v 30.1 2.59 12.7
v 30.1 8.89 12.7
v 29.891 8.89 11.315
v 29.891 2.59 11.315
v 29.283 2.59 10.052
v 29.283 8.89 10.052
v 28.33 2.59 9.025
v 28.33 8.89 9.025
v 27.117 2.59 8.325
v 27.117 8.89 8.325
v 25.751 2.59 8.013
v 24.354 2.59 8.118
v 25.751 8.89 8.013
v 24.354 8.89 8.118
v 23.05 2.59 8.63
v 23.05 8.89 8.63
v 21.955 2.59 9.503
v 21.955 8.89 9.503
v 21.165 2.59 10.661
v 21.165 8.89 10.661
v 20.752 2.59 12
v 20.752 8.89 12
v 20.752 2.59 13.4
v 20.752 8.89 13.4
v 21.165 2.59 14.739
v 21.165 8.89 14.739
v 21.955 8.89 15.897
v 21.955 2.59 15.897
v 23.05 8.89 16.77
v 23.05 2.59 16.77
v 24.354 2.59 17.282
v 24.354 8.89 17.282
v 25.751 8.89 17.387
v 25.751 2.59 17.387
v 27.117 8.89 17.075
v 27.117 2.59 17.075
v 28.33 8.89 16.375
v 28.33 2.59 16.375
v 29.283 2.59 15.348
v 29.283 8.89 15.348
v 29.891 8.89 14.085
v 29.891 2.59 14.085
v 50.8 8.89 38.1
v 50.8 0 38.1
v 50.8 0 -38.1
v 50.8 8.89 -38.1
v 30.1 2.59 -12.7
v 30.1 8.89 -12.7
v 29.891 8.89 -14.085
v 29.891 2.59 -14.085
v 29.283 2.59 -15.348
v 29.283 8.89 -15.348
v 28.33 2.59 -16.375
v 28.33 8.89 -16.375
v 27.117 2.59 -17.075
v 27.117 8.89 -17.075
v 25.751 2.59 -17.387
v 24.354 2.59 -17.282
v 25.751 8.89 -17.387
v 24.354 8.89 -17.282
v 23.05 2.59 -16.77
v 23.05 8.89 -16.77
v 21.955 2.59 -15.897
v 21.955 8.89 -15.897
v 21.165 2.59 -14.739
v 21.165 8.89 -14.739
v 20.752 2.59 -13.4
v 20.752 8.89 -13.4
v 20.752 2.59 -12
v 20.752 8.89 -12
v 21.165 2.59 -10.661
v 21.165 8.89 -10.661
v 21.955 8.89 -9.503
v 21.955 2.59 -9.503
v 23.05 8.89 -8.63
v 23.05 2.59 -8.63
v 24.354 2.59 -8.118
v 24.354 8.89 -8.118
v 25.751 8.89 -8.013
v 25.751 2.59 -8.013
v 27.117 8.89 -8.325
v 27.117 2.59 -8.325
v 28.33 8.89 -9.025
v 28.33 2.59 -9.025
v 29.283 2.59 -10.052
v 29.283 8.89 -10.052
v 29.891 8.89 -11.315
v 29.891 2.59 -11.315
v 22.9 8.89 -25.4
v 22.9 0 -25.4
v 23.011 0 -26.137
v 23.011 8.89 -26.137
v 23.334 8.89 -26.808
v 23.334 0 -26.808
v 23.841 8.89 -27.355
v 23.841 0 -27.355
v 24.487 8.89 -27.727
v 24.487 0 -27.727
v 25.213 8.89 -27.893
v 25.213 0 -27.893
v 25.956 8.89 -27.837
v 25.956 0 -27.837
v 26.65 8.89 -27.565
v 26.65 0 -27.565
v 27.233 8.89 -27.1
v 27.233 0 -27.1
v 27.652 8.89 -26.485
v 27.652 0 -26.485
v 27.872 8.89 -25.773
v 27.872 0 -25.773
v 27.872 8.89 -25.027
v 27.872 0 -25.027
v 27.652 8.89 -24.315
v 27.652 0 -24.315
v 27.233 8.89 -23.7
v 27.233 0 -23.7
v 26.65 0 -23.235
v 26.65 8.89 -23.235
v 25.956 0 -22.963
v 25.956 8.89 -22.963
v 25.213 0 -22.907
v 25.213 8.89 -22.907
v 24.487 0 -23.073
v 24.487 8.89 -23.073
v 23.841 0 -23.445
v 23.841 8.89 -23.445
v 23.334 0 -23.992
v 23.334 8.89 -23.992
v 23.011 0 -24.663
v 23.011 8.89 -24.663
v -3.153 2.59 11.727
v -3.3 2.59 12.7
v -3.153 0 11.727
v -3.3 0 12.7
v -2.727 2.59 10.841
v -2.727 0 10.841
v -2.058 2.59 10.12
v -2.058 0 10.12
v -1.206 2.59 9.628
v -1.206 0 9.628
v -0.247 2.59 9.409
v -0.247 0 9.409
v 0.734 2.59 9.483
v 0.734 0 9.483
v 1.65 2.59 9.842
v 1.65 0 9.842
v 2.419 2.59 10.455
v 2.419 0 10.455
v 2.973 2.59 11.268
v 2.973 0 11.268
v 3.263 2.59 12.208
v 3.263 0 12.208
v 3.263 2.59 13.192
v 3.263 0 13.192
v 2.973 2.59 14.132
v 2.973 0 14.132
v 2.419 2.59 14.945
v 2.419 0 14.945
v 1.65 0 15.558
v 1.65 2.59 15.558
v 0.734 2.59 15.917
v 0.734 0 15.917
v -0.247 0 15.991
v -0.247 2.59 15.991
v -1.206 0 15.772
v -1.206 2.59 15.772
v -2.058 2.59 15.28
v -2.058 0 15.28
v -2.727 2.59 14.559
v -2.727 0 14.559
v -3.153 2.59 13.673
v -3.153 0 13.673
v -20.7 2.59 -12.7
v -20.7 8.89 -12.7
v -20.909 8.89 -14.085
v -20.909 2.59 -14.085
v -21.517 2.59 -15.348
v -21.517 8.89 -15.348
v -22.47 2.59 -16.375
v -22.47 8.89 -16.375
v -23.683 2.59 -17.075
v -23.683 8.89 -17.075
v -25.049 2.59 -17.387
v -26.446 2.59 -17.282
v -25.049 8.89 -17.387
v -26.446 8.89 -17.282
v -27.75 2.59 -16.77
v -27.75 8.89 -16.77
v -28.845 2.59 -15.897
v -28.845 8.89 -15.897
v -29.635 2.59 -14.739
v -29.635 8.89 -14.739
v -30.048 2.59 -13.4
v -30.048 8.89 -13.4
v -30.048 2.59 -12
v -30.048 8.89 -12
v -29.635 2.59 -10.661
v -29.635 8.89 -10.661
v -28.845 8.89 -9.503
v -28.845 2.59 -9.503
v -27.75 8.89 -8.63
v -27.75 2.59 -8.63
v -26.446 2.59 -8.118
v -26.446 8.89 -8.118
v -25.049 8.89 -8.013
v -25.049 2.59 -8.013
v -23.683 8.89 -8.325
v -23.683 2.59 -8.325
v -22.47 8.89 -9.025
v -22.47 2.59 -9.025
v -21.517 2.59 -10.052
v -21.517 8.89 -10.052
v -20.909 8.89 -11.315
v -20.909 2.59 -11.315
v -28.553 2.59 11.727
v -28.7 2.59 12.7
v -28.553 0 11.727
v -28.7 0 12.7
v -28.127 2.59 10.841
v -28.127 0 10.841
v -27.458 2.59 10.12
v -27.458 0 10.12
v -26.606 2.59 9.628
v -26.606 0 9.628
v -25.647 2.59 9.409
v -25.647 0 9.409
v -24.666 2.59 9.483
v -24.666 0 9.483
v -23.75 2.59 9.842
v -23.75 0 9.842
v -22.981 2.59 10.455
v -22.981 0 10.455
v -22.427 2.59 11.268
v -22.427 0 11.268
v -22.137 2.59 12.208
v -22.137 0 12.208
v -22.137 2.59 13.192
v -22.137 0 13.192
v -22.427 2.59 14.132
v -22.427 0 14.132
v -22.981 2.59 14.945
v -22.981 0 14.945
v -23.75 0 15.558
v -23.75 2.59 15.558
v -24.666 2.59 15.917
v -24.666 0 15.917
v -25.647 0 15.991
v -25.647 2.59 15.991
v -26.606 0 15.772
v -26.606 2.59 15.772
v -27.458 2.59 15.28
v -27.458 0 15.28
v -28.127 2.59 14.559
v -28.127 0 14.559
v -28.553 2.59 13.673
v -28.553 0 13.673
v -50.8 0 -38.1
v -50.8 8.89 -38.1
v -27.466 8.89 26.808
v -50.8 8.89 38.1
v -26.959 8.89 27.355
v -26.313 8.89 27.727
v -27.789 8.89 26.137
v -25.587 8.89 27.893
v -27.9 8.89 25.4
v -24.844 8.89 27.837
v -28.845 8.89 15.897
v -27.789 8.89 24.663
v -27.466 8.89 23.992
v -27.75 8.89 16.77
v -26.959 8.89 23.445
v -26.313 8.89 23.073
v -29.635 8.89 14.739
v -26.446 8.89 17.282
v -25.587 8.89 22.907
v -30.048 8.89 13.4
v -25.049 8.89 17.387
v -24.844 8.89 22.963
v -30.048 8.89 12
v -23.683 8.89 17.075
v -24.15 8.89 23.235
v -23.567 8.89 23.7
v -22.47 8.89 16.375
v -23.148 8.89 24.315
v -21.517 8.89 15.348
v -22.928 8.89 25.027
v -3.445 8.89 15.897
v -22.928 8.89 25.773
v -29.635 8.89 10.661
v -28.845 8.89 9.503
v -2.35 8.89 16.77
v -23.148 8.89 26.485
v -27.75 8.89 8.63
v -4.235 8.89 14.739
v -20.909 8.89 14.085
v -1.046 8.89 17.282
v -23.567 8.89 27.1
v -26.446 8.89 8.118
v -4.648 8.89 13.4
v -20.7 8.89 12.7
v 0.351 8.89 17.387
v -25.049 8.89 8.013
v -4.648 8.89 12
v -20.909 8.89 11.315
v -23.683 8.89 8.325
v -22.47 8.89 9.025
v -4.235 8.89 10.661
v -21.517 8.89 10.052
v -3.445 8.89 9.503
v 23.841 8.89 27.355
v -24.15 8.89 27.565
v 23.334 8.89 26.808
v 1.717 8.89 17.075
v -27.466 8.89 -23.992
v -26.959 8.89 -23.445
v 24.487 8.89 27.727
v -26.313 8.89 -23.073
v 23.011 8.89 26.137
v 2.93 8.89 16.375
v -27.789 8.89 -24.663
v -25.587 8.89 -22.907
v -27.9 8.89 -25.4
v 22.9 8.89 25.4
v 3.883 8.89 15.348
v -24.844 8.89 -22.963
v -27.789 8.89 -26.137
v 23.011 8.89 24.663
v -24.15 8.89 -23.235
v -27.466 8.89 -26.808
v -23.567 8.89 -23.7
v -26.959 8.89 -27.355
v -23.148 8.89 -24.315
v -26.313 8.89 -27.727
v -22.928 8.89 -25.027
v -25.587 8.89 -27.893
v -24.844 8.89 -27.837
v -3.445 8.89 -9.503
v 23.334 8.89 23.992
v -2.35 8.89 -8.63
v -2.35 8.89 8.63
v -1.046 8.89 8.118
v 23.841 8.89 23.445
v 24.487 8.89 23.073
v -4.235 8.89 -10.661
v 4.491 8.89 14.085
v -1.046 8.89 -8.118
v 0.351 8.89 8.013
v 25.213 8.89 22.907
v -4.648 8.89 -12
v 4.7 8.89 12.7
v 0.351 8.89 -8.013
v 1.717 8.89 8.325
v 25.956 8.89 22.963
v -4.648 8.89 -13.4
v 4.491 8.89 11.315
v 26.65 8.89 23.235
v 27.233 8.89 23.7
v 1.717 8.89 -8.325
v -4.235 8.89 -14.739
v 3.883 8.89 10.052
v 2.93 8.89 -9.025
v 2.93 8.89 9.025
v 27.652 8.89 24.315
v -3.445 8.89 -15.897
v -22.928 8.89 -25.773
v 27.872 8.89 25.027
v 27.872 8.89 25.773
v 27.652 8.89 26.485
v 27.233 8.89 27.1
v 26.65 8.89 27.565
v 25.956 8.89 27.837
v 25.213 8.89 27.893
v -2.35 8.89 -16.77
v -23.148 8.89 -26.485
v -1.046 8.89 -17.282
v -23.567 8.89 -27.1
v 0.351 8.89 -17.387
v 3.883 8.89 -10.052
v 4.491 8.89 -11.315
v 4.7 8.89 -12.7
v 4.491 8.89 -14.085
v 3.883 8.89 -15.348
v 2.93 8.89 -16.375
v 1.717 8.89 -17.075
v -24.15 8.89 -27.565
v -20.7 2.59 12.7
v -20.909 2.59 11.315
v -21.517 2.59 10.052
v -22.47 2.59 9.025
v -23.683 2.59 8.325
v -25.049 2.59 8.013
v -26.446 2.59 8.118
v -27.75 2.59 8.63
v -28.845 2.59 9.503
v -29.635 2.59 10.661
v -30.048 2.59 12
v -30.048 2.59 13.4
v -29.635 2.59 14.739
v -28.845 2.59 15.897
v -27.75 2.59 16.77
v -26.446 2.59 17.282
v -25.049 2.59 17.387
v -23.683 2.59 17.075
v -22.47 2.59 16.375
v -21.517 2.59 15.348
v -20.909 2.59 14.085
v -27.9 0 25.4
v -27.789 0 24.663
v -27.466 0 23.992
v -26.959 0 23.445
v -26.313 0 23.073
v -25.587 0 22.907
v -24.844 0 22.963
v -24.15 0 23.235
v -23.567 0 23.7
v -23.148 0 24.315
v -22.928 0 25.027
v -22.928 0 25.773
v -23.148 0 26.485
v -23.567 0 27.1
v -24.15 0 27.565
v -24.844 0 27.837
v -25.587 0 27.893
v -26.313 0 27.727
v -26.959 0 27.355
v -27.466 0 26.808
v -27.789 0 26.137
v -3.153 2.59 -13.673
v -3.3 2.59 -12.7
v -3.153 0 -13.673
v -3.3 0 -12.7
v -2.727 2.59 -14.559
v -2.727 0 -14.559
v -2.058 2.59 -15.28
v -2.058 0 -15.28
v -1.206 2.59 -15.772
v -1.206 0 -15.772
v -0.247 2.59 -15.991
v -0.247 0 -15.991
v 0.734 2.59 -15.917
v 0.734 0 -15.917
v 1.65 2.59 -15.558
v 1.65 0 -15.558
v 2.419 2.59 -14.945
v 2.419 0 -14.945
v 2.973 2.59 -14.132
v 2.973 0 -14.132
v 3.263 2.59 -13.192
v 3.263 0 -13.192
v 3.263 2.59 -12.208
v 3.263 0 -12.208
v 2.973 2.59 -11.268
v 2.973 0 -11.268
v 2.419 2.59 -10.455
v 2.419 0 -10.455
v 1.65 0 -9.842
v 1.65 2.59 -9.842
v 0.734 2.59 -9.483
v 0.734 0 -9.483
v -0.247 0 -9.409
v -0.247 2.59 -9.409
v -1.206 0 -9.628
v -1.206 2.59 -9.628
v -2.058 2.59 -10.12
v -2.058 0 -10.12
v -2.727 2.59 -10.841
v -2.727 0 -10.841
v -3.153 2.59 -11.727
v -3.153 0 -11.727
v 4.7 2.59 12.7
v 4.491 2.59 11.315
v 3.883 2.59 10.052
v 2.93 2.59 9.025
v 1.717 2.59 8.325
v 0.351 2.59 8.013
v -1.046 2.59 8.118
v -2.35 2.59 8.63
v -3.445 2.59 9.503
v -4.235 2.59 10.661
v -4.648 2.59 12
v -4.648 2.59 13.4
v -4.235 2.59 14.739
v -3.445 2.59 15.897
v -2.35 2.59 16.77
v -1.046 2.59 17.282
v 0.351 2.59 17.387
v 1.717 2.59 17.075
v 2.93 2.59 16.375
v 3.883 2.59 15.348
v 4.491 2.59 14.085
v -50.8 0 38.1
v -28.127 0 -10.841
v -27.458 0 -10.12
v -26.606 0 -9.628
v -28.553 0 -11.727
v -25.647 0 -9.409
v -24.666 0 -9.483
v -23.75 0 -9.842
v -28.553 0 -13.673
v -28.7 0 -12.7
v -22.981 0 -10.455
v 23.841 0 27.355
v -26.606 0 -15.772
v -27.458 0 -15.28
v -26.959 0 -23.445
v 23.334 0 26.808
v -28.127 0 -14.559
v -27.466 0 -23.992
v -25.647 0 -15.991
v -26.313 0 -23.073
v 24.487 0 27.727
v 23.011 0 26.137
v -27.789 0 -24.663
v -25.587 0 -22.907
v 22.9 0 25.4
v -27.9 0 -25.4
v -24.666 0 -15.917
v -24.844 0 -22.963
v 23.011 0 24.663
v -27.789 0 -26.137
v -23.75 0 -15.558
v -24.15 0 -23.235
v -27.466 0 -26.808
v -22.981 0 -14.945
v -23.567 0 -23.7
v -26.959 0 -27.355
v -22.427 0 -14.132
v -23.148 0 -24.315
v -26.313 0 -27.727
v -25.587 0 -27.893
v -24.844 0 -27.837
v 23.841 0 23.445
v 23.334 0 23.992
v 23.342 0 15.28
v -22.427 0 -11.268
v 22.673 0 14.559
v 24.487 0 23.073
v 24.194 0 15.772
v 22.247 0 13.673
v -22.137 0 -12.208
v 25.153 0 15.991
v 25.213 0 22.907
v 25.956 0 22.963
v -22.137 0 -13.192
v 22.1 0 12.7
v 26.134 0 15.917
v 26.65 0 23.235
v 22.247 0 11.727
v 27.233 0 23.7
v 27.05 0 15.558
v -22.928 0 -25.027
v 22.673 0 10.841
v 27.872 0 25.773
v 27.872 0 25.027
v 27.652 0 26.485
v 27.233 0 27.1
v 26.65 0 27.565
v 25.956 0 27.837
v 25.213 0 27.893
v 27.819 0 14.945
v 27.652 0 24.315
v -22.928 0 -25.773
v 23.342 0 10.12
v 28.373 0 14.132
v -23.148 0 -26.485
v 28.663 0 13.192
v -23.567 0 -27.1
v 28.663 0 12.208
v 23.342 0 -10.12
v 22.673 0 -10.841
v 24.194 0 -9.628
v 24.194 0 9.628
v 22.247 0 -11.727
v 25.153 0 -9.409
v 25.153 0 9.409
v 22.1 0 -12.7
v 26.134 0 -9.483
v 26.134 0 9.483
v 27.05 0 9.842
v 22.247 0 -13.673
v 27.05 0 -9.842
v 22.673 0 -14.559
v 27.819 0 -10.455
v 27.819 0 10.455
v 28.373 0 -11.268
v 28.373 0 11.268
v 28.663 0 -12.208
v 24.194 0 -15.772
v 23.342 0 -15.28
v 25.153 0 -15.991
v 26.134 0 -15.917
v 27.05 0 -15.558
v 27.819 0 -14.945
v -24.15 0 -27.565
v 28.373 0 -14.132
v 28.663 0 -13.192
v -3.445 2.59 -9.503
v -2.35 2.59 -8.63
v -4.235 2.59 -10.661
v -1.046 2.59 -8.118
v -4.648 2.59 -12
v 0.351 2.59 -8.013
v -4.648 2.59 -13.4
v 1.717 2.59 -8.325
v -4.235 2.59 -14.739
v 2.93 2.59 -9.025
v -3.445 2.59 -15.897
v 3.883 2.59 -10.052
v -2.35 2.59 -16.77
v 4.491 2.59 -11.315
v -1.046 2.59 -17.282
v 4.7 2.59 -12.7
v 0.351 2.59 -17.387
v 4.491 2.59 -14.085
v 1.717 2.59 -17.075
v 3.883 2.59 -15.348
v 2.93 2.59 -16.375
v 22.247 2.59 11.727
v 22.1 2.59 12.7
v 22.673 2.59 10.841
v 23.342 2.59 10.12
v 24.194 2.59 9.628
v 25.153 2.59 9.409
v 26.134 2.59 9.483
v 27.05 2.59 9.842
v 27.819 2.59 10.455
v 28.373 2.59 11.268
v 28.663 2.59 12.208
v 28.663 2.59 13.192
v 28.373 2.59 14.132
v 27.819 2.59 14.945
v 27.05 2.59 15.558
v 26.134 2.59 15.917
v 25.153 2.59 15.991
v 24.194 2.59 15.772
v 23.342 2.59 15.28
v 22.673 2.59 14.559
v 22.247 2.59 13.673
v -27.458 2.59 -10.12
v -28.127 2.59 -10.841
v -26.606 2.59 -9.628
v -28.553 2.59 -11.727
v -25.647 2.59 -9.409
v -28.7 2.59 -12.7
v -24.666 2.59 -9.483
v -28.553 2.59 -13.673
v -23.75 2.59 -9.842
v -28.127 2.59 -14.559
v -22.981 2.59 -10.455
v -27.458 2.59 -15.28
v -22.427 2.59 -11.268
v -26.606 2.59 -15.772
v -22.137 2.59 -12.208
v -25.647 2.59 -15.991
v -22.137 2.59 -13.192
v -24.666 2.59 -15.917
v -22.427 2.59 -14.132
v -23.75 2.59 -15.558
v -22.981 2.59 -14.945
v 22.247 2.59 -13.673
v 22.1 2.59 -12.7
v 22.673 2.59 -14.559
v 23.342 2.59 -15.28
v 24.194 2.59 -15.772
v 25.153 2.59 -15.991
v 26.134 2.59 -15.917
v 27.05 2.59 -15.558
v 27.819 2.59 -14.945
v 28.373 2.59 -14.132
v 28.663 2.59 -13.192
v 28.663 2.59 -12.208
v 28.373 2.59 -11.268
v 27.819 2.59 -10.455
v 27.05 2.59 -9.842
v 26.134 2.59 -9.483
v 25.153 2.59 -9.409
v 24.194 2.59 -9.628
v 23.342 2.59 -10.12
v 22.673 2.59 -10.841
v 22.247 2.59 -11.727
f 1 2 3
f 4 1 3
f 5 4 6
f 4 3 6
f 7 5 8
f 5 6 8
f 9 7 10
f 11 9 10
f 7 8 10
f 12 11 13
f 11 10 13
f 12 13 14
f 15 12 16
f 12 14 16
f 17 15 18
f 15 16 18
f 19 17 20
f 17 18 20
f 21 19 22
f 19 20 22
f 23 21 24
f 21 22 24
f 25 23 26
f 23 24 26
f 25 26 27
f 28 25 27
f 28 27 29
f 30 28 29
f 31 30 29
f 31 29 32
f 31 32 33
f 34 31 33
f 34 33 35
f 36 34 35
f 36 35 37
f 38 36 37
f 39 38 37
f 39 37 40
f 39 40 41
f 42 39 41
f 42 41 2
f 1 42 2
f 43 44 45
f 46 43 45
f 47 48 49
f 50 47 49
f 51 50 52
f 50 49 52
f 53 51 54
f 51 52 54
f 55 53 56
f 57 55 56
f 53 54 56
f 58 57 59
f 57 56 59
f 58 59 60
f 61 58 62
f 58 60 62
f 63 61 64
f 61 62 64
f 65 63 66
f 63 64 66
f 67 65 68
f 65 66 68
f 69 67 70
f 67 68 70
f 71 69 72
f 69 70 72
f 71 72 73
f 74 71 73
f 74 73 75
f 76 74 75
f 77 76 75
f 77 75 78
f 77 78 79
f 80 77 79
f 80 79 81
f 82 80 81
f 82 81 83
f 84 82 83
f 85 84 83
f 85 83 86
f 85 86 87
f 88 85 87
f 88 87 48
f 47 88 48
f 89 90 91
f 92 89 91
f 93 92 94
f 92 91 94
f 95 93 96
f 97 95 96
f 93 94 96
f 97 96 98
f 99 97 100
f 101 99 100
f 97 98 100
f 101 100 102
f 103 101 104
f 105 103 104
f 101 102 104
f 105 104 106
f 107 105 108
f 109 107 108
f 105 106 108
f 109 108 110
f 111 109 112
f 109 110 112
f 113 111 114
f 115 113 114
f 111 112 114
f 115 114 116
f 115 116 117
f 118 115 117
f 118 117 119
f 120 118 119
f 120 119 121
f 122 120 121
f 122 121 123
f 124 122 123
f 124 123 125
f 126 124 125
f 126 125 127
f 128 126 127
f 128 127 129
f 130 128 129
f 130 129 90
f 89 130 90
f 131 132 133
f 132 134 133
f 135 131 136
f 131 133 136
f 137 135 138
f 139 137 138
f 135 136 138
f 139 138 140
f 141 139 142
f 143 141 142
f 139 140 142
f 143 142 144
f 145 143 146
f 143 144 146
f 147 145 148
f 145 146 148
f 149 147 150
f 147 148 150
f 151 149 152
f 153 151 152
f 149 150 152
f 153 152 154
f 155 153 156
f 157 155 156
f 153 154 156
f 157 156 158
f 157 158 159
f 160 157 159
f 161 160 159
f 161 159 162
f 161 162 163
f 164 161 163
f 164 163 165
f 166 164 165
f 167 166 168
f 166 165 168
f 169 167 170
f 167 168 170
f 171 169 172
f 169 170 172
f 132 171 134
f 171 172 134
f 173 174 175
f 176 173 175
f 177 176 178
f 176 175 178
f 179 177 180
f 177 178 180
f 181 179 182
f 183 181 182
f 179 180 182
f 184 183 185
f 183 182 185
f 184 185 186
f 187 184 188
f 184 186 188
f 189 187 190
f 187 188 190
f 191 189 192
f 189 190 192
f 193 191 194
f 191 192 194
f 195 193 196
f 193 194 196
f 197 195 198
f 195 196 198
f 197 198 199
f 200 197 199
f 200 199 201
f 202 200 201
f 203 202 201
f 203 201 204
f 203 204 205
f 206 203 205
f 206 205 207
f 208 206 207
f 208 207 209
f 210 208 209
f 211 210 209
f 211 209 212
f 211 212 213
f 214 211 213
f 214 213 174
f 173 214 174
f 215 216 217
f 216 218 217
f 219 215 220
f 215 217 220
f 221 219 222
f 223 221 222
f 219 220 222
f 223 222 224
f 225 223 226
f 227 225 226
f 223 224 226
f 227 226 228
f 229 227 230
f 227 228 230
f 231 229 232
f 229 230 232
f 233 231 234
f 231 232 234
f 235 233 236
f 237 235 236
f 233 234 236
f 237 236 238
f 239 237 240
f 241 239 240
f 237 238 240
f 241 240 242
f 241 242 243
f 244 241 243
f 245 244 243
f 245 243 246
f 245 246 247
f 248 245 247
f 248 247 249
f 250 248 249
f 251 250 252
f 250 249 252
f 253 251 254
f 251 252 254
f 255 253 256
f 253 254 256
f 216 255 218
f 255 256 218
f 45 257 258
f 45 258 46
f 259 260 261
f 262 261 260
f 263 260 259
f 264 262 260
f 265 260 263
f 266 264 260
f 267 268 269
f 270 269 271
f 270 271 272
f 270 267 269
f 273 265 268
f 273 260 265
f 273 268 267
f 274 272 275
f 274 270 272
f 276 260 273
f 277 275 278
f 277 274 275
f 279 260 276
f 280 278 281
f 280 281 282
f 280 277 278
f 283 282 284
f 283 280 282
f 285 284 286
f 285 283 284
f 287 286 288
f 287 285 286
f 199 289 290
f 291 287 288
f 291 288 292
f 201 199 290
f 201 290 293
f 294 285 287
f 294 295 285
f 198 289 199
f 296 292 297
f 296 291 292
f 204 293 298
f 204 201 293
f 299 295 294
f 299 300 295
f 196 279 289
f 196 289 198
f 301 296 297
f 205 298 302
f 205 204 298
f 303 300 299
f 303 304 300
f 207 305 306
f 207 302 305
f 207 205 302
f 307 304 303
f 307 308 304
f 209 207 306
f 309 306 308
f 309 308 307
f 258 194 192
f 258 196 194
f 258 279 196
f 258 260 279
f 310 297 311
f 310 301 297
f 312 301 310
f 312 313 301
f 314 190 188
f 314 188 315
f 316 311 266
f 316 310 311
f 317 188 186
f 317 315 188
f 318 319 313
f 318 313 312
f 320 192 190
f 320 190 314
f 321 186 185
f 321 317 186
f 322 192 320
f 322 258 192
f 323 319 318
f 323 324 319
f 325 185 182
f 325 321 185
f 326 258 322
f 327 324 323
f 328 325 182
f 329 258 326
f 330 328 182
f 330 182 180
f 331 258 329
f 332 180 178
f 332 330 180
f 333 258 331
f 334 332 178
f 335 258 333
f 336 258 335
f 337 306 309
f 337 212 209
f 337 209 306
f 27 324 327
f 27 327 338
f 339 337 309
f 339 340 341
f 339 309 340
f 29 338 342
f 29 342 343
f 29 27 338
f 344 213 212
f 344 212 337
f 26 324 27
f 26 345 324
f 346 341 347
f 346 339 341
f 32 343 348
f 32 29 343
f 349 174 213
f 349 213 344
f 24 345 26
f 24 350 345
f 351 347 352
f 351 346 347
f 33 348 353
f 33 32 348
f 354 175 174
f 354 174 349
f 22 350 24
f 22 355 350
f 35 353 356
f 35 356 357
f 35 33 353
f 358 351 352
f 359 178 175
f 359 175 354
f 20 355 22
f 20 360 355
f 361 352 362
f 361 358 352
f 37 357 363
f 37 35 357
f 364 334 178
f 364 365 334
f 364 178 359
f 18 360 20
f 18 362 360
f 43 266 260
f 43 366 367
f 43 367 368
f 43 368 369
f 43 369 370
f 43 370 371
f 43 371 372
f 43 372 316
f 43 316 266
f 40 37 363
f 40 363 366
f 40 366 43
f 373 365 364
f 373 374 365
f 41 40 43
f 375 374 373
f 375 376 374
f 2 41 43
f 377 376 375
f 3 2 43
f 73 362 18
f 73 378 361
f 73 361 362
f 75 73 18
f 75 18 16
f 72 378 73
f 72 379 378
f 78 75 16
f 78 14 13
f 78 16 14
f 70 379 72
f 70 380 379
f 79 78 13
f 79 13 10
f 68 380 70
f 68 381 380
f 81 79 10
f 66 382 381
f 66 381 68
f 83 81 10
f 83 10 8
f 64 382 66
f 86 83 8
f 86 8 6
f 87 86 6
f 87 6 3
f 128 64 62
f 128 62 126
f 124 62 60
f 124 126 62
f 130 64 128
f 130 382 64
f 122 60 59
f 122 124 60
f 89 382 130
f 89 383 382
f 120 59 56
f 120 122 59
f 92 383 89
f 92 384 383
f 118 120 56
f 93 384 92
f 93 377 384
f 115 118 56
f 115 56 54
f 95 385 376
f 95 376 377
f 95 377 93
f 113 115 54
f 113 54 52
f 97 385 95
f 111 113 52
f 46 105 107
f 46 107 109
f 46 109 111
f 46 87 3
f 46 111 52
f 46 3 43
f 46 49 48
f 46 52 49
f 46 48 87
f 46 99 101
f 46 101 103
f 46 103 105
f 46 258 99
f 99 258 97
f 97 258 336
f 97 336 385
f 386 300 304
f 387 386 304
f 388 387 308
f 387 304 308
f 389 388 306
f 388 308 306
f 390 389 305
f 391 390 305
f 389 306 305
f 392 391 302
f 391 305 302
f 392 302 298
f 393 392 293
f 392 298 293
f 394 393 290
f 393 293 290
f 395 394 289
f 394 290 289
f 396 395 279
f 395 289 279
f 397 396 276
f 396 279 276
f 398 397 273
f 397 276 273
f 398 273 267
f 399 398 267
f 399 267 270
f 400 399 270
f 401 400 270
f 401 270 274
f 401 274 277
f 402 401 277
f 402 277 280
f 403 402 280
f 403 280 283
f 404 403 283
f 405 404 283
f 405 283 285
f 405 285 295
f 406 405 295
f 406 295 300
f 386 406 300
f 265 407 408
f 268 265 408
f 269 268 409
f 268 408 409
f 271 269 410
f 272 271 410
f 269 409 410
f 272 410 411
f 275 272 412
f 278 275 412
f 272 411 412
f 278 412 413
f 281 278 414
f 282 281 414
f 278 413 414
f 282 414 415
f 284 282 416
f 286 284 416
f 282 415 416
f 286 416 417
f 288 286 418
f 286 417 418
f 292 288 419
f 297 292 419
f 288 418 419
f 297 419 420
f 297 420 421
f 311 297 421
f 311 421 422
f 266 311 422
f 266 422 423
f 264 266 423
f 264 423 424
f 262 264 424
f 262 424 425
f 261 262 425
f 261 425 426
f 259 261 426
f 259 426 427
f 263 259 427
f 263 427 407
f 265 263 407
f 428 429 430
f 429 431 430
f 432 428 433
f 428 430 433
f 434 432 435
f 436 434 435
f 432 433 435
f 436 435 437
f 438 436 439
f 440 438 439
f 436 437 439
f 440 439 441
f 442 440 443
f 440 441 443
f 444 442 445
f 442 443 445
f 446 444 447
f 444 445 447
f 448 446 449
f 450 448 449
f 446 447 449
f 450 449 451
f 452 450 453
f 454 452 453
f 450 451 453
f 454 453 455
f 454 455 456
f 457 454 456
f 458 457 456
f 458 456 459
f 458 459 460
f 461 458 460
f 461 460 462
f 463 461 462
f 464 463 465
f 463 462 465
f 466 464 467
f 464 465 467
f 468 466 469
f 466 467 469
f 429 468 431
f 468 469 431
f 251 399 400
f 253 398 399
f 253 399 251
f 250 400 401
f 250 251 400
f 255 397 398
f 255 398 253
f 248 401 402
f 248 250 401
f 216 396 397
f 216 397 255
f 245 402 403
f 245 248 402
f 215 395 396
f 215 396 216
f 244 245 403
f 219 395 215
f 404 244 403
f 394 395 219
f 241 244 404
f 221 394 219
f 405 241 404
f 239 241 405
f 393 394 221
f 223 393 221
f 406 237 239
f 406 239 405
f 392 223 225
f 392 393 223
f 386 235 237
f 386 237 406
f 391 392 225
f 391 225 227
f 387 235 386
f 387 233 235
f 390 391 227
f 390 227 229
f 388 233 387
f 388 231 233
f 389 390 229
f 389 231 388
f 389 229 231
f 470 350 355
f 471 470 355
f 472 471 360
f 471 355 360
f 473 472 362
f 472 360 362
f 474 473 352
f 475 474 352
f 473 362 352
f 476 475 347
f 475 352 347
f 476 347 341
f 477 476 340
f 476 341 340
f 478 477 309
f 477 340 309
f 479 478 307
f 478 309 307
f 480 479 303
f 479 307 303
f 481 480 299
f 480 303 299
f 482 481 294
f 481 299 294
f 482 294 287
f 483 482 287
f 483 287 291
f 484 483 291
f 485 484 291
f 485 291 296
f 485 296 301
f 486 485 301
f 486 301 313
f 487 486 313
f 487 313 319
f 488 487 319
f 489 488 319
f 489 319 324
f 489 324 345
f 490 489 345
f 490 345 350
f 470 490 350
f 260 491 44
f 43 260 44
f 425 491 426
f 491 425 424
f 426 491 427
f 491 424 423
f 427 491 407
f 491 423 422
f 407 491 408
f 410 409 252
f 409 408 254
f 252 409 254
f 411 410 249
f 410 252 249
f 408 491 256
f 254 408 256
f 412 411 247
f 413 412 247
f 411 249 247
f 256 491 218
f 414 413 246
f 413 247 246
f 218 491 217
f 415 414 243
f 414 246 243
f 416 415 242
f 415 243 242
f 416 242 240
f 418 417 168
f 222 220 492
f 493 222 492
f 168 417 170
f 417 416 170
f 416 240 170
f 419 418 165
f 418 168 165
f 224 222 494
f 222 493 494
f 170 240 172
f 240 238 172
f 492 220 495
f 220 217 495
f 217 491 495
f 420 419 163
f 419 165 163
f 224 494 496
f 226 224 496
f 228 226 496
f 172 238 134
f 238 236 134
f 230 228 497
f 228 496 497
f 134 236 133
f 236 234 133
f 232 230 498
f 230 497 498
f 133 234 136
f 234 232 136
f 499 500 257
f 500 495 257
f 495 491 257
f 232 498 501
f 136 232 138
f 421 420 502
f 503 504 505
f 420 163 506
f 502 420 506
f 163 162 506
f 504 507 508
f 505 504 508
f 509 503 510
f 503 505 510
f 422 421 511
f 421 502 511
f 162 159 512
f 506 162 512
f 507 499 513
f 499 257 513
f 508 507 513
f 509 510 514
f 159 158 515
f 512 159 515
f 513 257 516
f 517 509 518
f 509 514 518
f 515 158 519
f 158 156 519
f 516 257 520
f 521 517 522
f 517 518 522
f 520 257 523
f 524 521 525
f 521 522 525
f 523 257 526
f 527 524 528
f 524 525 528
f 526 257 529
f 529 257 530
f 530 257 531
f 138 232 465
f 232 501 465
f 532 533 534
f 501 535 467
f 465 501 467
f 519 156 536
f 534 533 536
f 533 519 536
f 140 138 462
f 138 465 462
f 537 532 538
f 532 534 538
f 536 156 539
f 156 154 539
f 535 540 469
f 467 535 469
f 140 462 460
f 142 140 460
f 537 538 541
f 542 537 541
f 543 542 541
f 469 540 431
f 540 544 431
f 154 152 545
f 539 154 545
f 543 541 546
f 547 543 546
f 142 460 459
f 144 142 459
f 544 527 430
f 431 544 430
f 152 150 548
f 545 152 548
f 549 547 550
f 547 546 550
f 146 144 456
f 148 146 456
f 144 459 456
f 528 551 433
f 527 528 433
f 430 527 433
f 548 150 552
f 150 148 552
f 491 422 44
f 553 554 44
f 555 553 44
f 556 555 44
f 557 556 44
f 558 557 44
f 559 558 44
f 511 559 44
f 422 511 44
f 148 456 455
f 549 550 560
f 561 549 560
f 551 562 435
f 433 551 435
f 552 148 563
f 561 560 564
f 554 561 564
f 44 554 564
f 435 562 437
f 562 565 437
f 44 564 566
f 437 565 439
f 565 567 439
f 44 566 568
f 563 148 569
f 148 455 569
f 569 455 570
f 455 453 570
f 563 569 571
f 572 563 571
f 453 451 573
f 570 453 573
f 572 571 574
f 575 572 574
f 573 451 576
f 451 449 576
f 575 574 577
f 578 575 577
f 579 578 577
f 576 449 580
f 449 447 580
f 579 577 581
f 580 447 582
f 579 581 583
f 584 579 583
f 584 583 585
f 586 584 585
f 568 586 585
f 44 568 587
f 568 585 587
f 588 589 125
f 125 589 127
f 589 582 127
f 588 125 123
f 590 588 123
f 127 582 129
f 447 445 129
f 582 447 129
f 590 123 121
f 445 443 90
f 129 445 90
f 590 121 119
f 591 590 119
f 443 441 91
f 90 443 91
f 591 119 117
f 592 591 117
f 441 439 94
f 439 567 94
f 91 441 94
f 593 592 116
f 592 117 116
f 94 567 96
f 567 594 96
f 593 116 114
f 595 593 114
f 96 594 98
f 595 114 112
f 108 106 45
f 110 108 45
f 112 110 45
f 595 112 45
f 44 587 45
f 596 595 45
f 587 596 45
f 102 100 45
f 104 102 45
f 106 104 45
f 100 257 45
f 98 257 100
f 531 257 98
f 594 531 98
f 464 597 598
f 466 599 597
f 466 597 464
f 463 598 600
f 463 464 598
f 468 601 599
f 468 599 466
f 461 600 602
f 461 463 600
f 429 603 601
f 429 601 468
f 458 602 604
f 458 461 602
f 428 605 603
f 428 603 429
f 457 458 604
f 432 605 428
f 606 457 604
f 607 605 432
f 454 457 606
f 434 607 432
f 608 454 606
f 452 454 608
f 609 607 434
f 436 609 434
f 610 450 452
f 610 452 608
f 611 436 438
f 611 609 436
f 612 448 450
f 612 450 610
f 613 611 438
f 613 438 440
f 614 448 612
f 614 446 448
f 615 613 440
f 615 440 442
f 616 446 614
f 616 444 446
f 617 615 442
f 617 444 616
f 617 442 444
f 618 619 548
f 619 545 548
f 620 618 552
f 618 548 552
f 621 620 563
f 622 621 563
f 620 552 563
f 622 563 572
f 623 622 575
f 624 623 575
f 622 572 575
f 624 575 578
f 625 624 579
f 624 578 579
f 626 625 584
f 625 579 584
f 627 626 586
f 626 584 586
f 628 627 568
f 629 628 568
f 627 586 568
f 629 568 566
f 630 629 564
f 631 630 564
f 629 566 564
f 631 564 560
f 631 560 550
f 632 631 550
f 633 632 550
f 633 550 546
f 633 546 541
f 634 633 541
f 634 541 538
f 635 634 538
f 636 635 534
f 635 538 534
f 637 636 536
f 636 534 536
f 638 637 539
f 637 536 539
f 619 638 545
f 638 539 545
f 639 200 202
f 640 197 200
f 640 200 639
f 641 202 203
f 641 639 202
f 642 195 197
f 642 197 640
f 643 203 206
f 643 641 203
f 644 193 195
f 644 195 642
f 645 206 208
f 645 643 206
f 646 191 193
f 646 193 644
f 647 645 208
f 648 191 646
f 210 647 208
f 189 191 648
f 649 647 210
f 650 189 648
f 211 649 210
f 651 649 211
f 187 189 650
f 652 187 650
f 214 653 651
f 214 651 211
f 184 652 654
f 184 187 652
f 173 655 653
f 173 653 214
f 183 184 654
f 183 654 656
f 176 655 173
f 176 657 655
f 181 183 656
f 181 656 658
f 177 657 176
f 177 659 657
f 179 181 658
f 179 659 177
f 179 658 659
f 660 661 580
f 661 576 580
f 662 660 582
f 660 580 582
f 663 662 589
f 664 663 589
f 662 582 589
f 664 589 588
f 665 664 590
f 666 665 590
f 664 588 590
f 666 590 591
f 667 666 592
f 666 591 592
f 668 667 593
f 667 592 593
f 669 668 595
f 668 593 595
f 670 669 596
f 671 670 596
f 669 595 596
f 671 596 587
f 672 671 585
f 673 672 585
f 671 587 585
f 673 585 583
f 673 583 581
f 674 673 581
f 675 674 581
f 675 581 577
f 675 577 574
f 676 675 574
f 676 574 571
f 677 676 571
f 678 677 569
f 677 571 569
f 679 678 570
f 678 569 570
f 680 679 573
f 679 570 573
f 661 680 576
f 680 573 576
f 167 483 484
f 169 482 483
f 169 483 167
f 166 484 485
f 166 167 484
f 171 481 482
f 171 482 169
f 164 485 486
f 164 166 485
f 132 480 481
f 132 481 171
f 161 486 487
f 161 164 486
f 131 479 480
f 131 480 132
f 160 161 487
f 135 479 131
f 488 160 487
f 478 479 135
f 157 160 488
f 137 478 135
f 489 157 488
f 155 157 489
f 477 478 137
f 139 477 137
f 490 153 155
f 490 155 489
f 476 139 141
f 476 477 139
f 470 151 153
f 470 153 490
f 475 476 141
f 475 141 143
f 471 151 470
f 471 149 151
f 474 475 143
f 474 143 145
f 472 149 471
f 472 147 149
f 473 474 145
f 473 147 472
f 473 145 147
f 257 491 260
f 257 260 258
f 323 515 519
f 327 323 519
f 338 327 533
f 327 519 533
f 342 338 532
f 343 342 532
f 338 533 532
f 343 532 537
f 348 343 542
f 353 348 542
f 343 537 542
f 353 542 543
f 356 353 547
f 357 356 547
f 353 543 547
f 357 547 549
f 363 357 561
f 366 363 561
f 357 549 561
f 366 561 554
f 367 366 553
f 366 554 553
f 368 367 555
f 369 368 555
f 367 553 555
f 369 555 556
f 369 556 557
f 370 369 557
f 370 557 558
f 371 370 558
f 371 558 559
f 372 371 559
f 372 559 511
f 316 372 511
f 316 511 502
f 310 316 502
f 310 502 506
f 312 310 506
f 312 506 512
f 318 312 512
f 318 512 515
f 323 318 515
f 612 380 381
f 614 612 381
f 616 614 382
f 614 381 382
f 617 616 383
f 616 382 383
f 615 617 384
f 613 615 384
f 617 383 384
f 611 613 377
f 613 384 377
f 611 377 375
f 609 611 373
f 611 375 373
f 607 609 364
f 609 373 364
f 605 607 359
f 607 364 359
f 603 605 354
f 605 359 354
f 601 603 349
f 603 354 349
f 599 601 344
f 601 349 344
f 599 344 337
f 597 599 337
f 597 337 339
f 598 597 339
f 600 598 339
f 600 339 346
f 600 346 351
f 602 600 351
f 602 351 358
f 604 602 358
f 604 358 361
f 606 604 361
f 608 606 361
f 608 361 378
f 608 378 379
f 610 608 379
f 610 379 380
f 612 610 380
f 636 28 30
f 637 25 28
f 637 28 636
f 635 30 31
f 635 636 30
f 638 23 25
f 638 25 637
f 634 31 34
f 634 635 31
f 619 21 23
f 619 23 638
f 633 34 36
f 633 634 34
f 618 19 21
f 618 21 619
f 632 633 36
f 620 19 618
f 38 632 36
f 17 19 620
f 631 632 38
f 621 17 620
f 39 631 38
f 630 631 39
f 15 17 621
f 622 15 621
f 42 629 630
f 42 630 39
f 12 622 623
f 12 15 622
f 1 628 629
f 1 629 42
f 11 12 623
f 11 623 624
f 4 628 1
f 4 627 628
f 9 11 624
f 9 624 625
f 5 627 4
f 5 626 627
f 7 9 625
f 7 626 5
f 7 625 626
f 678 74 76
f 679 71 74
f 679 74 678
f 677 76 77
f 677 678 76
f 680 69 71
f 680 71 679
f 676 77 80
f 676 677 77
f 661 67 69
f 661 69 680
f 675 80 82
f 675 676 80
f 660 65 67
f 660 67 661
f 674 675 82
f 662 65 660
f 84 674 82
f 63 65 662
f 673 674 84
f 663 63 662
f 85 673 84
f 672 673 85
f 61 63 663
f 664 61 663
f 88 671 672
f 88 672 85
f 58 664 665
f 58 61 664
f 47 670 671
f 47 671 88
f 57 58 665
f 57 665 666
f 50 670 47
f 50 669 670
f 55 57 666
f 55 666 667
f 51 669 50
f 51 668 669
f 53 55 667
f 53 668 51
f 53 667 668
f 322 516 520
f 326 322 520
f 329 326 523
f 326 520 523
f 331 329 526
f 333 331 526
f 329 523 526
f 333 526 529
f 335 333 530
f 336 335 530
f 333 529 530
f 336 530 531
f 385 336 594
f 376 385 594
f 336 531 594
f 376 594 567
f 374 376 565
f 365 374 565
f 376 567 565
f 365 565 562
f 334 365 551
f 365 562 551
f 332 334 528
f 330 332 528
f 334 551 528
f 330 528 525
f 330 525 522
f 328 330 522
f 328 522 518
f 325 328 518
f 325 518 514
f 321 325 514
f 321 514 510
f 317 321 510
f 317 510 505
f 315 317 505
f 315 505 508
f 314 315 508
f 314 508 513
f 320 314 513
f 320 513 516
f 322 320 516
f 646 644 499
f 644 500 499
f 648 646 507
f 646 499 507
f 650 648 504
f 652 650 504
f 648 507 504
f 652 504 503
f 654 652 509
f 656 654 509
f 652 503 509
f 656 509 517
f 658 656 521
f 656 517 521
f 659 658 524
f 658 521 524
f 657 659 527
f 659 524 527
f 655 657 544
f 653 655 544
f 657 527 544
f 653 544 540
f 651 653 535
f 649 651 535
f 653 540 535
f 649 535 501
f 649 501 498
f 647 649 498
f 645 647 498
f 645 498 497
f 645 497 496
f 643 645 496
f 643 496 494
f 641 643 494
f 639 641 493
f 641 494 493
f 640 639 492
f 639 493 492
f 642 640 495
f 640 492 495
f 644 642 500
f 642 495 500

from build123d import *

# Parameters (mm, degrees)
SKETCH1_W                      = 101.6
SKETCH1_H                      = 76.2
BOSS_EXTRUDE1_DEPTH            = 8.89
TAP_DRILL_FOR_M6X1_0_TAP1_D    = 5
CBORE_FOR_M6_SHCS1_D           = 6.6
CBORE_FOR_M6_SHCS1_CBORE_D     = 9.4
CBORE_FOR_M6_SHCS1_CBORE_DEPTH = 6.3


with BuildPart() as part:
    # Sketch1 → Boss-Extrude1 (new body)
    with BuildSketch(Plane(origin=(0, 0, 0), x_dir=(1, 0, 0), z_dir=(0, 1, 0))):
        Rectangle(SKETCH1_W, SKETCH1_H)
    extrude(amount=BOSS_EXTRUDE1_DEPTH)

    # Tap Drill for M6x1.0 Tap1 (through all)
    with Locations(Plane(origin=(0, 8.89, 0), x_dir=(1, 0, 0), z_dir=(0, 1, 0))):
        with Locations((-25.4, 25.4), (25.4, 25.4), (25.4, -25.4), (-25.4, -25.4)):
            Hole(TAP_DRILL_FOR_M6X1_0_TAP1_D / 2)

    # CBORE for M6 SHCS1 (through all)
    with Locations(Plane(origin=(0, 8.89, 0), x_dir=(1, 0, 0), z_dir=(0, 1, 0))):
        with Locations((-25.4, 12.7), (-25.4, -12.7), (0, -12.7), (0, 12.7), (25.4, 12.7), (25.4, -12.7)):
            CounterBoreHole(CBORE_FOR_M6_SHCS1_D / 2, CBORE_FOR_M6_SHCS1_CBORE_D / 2, CBORE_FOR_M6_SHCS1_CBORE_DEPTH)


solid = part.part
